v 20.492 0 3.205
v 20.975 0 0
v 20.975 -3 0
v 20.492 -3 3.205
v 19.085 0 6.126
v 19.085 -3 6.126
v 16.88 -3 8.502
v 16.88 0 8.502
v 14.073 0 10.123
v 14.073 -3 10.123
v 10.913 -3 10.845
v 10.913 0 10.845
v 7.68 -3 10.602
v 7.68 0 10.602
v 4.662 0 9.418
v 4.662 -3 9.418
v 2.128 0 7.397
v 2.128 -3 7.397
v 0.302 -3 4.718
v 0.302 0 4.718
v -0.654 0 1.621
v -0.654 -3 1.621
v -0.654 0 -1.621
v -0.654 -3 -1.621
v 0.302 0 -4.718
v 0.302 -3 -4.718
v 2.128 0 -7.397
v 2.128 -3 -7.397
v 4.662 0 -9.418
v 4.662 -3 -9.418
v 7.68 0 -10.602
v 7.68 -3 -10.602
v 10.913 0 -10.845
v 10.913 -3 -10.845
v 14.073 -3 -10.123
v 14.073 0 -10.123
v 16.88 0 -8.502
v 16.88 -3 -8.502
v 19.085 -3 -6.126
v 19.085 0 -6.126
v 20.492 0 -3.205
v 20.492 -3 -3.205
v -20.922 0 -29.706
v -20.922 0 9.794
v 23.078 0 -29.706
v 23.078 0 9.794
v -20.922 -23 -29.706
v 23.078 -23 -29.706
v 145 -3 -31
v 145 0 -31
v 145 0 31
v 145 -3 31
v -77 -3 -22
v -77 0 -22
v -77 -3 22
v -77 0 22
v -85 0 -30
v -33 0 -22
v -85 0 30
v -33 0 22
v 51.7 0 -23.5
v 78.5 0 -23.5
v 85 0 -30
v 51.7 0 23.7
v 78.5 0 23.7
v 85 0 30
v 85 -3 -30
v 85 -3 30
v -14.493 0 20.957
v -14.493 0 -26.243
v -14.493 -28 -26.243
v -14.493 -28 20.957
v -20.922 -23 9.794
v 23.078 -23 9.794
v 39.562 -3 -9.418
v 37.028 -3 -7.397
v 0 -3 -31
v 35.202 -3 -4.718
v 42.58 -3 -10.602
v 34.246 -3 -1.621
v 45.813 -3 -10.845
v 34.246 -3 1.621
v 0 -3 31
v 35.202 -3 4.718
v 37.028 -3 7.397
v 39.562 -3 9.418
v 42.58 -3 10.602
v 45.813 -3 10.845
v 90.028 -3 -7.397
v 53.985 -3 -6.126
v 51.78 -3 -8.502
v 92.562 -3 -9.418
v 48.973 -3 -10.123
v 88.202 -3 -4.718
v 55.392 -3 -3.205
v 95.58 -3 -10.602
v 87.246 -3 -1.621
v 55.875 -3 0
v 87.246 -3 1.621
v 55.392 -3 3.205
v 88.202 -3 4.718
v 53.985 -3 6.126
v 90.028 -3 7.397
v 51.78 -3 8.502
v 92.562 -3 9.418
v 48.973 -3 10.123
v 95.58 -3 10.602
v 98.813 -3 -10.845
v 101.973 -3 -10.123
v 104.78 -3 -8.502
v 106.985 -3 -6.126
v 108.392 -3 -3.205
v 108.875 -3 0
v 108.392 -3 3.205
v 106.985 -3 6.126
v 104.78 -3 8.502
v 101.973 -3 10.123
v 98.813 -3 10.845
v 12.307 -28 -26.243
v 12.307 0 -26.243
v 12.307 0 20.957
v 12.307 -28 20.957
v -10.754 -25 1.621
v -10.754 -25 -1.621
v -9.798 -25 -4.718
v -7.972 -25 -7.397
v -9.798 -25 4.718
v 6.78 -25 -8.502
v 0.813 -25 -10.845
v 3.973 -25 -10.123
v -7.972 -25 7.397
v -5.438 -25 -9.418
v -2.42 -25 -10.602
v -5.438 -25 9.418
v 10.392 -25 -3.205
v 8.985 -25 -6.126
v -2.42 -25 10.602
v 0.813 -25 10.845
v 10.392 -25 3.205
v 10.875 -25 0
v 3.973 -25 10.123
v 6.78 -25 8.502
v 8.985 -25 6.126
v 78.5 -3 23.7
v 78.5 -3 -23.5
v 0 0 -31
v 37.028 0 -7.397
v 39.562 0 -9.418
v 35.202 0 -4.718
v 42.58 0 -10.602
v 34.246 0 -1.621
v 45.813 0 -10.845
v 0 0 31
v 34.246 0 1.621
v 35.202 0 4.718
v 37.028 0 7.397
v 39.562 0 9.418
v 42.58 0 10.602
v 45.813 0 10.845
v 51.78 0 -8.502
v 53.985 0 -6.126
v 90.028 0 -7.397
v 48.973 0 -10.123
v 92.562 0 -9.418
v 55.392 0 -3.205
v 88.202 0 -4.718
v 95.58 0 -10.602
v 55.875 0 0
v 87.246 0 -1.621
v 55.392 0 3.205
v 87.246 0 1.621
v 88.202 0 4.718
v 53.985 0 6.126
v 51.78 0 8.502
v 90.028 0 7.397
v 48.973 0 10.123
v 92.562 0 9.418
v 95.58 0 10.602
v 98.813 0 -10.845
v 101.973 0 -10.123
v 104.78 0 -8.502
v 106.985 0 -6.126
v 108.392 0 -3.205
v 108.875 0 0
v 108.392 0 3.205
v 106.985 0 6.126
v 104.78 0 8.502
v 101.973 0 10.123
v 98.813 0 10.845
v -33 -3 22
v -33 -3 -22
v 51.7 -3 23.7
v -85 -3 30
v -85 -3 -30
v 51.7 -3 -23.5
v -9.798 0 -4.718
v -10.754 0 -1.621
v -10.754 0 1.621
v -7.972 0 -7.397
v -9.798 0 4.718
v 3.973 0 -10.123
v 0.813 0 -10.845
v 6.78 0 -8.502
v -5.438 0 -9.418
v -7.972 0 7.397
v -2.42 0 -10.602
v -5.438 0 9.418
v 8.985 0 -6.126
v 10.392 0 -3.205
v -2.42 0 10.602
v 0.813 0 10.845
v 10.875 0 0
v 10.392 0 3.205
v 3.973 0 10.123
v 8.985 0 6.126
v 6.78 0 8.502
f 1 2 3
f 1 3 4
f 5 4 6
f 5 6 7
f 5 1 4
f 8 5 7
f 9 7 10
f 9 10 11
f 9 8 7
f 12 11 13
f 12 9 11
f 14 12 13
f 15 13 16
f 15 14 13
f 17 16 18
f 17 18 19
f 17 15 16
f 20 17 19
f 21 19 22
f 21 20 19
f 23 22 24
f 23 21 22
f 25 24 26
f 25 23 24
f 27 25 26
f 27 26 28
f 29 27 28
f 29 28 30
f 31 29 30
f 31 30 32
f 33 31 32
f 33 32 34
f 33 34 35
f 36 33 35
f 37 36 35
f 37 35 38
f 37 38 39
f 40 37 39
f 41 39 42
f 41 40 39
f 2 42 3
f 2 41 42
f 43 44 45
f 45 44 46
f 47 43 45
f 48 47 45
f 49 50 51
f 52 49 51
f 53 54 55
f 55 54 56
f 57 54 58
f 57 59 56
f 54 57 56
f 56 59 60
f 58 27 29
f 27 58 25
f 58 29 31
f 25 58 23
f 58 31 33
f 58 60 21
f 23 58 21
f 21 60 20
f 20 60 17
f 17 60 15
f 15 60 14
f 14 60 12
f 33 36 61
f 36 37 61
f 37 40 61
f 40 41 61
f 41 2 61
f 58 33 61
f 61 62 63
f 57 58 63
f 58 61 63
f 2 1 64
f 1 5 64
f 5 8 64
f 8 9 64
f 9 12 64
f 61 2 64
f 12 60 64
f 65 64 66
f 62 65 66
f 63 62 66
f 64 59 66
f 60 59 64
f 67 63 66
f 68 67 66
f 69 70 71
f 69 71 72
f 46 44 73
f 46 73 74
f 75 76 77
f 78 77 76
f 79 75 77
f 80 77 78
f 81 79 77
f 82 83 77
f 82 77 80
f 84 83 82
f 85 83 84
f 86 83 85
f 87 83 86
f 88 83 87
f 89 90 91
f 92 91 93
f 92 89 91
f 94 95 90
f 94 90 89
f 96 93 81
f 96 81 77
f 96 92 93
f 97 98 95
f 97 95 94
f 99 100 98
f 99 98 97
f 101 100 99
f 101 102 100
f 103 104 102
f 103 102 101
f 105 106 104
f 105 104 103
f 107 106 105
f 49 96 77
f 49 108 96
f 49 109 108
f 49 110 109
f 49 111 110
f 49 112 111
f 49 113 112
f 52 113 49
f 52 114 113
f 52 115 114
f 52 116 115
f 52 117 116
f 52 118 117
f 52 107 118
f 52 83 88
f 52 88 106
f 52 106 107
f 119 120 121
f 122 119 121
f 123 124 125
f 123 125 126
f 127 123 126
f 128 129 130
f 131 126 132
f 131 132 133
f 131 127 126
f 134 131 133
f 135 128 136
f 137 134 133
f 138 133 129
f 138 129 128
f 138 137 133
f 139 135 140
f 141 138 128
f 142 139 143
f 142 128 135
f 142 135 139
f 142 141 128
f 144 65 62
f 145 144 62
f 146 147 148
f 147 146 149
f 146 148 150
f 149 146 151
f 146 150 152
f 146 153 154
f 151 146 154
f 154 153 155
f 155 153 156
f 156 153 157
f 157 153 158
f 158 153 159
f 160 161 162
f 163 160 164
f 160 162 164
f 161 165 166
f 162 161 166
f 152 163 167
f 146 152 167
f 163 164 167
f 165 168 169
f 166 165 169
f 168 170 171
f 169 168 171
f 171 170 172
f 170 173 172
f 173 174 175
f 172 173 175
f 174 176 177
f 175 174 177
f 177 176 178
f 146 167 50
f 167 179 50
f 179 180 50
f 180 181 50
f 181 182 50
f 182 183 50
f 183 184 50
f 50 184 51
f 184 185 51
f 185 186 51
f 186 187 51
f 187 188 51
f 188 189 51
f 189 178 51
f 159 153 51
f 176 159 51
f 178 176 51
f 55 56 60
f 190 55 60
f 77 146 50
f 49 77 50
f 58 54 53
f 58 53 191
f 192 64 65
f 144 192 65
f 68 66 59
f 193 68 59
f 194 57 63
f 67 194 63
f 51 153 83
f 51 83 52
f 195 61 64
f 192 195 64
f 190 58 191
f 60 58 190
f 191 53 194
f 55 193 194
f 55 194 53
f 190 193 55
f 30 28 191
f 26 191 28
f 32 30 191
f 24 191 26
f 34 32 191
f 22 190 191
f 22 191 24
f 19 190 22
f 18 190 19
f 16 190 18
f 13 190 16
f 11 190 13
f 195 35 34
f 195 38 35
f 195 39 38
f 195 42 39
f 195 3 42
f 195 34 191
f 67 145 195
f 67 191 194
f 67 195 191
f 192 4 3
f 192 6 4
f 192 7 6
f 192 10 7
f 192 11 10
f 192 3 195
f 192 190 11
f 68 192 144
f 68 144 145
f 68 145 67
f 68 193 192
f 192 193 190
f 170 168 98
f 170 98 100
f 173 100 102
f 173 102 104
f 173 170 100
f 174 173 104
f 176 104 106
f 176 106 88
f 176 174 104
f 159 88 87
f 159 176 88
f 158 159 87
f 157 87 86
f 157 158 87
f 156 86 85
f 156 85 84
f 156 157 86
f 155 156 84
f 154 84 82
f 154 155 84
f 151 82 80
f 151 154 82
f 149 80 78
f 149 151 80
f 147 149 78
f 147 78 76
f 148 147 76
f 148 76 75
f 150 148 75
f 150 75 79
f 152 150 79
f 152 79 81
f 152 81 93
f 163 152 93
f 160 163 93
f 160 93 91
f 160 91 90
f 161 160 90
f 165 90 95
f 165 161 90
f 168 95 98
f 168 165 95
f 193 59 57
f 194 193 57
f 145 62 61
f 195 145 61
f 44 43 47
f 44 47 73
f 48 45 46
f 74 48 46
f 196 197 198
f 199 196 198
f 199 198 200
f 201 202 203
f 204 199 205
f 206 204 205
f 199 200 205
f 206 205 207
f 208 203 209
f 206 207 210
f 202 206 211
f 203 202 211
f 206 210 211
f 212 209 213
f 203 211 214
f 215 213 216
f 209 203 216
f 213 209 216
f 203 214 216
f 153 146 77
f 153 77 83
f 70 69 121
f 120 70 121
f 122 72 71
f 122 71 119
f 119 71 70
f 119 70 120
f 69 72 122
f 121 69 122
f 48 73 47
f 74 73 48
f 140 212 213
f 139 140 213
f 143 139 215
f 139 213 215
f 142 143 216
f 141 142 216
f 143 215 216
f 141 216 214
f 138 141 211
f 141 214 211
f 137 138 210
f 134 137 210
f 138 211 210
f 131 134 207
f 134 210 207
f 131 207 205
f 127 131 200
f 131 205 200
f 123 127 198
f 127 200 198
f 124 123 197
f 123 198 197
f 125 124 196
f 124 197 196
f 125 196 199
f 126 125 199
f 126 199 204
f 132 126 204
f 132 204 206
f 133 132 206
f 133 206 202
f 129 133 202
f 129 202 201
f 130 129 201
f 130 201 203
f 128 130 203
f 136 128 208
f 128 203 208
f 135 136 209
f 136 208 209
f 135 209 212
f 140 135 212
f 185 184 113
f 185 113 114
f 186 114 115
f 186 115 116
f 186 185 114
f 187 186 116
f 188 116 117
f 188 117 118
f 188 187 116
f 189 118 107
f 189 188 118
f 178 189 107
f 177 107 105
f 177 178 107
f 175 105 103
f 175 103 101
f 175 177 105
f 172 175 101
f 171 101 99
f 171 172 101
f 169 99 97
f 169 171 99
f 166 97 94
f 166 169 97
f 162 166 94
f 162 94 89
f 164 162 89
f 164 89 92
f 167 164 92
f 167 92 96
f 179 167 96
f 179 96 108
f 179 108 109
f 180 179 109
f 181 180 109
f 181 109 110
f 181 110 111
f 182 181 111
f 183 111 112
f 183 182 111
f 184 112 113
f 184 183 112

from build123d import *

# Parameters (mm, degrees)
F0_W     = 26.8
F0_H     = 47.2
F1_DEPTH = 28
F2_W     = 44
F2_H     = 39.5
F3_DEPTH = 23
F4_R     = 10.875
F5_DEPTH = 25
F6_W     = 145
F6_H     = 62
F6_R     = 10.875
F7_DEPTH = 3
F8_W     = 44
F8_H     = 44
F8_R     = 10.875
F9_DEPTH = 3


with BuildPart() as f1:
    # F0 (on Front) → F1 (new body)
    with BuildSketch(Plane.XZ):
        with Locations((-1.093476, -2.643221)):
            Rectangle(F0_W, F0_H)
    extrude(amount=F1_DEPTH)


with BuildPart() as f3:
    # F2 (on Front) → F3 (new body)
    with BuildSketch(Plane.XZ):
        with Locations((1.078436, -9.956353)):
            Rectangle(F2_W, F2_H)
    extrude(amount=F3_DEPTH)


with BuildPart() as f5:
    # F4 (on Front) → F5 (new body)
    with BuildSketch(Plane.XZ):
        Circle(F4_R)
    extrude(amount=F5_DEPTH)


with BuildPart() as f7:
    # F6 (on Front) → F7 (new body)
    with BuildSketch(Plane.XZ):
        with Locations((72.5, 0)):
            Rectangle(F6_W, F6_H)
        with Locations((45, 0)):
            Circle(F6_R, mode=Mode.SUBTRACT)
        with Locations((98, 0)):
            Circle(F6_R, mode=Mode.SUBTRACT)
    extrude(amount=F7_DEPTH)


with BuildPart() as f9:
    # F8 (on Front) → F9 (new body)
    with BuildSketch(Plane.XZ):
        Polygon((-85, 30), (-85, 0), (-85, -30), (85, -30), (85, 0), (85, 30), align=None)
        with Locations((-55, 0)):
            Rectangle(F8_W, F8_H, mode=Mode.SUBTRACT)
        with Locations((10.1, 0)):
            Circle(F8_R, mode=Mode.SUBTRACT)
        Polygon((51.7, 23.7), (65.1, 23.7), (78.5, 23.7), (78.5, -23.5), (65.1, -23.5), (51.7, -23.5), align=None, mode=Mode.SUBTRACT)
    extrude(amount=F9_DEPTH)


solid = Compound([f1.part, f3.part, f5.part, f7.part, f9.part])
